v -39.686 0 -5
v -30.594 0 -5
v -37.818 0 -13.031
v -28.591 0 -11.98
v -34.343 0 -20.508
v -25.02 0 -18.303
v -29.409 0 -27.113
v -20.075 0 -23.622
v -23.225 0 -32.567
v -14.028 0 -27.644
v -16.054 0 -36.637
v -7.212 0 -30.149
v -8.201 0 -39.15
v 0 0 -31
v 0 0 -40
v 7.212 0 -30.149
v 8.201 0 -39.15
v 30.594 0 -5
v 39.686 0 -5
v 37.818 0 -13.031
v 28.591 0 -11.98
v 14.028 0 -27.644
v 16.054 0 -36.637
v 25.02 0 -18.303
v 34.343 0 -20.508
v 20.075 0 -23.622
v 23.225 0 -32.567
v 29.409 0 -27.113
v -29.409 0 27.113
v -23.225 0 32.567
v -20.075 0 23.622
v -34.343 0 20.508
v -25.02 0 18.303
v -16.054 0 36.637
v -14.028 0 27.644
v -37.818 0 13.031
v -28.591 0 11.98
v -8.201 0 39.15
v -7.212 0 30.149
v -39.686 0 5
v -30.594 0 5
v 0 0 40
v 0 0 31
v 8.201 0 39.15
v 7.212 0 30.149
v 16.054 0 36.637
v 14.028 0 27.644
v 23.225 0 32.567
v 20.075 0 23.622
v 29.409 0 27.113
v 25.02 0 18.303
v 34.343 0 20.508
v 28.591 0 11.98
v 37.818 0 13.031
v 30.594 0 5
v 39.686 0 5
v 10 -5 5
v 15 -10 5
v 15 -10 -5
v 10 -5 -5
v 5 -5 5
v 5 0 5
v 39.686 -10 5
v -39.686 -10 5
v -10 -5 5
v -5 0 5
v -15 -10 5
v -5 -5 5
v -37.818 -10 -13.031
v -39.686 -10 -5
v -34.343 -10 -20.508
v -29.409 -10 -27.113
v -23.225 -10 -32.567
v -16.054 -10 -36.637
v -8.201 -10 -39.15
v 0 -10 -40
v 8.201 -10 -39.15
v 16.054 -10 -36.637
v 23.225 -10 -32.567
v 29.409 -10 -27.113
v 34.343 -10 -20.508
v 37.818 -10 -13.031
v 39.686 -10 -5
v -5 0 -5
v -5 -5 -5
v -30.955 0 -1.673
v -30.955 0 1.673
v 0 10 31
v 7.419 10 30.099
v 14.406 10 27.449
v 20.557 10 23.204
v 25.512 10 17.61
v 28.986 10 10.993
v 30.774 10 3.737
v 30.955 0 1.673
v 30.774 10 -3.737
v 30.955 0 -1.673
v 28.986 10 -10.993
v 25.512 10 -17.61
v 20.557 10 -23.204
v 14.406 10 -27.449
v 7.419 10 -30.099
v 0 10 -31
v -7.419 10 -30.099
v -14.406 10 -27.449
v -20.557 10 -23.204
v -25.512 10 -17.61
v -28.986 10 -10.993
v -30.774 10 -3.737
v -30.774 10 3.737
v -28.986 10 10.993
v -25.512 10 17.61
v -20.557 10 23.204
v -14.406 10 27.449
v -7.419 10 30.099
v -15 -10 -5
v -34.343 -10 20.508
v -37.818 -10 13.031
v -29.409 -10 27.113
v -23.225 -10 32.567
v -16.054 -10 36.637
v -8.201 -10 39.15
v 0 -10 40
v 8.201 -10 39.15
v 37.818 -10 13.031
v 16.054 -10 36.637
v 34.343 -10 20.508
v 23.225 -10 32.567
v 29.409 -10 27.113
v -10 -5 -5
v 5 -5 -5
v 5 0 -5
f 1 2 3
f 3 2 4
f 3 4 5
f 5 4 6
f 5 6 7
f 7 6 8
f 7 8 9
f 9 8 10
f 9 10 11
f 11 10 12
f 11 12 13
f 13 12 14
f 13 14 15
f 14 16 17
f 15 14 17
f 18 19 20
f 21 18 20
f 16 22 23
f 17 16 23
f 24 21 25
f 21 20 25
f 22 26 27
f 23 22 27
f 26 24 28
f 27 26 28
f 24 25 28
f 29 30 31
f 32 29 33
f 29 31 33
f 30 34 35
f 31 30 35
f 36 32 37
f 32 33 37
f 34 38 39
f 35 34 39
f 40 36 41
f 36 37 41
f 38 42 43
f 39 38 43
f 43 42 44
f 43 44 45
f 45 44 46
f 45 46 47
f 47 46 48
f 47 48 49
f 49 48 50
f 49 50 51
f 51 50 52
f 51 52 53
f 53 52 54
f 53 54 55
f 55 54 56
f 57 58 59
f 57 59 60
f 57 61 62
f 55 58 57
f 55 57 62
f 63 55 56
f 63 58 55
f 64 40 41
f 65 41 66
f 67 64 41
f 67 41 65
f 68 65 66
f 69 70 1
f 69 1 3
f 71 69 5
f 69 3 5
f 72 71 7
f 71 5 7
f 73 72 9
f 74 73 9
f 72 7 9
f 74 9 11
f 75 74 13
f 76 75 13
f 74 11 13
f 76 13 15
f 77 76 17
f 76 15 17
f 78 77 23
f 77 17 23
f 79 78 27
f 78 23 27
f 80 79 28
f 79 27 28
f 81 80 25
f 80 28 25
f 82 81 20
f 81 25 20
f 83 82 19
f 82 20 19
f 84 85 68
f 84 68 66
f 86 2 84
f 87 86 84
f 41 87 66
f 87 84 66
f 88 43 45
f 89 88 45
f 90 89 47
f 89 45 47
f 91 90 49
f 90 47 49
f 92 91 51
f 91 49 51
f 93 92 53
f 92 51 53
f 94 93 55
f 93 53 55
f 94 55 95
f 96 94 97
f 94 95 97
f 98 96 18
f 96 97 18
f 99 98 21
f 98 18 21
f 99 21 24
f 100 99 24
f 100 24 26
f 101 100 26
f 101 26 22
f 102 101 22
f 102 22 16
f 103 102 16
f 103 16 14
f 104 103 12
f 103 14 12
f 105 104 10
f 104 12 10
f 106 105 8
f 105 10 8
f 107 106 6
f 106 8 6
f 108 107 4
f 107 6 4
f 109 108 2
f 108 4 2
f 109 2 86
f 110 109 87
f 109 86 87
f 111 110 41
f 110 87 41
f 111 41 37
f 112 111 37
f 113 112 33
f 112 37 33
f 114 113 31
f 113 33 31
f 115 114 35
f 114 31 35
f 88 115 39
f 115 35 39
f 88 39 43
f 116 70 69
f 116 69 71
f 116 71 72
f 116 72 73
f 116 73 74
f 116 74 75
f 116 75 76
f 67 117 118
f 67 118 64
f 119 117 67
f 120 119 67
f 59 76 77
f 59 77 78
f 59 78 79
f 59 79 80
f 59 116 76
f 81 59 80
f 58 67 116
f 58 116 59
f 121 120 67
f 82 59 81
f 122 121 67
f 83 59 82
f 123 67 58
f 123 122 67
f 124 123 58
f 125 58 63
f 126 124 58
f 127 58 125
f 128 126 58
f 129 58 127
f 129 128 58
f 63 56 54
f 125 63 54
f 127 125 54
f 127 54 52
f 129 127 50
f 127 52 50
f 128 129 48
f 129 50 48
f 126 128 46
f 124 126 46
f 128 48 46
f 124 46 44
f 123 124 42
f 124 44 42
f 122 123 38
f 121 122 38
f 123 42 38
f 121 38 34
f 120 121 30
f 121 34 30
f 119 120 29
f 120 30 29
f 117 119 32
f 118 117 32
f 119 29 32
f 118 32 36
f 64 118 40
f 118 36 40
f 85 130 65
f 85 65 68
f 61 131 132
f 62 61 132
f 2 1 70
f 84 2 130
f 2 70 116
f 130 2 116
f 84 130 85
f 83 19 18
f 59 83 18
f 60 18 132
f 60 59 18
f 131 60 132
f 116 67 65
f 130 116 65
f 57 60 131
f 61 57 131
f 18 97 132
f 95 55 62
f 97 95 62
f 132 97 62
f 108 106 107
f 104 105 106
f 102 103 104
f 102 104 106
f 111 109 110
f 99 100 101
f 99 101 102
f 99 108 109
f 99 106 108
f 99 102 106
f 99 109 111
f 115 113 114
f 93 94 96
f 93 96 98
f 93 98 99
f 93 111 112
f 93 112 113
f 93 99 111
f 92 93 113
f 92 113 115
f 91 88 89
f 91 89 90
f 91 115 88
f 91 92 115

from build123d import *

# Parameters (mm, degrees)
SKETCH1_R           = 31
BOSS_EXTRUDE1_DEPTH = 10
BOSS_EXTRUDE3_DEPTH = 10
CUT_EXTRUDE2_DEPTH  = 20
SKETCH8_R           = 40
BOSS_EXTRUDE4_DEPTH = 10
SKETCH9_W           = 7.5
SKETCH9_H           = 5
BOSS_EXTRUDE5_DEPTH = 10
CUT_EXTRUDE3_DEPTH  = 10


with BuildPart() as part:
    # Sketch1 → Boss-Extrude1 (new body)
    with BuildSketch(Plane(origin=(0, 0, 0), x_dir=(1, 0, 0), z_dir=(0, 1, 0))):
        with Locations(Location((0, 0, 0), (0, 0, 270))):
            Circle(SKETCH1_R)
    extrude(amount=BOSS_EXTRUDE1_DEPTH)

    # Sketch6 → Boss-Extrude3 (add)
    with BuildSketch(Plane(origin=(0, 0, 0), x_dir=(-1, 0, 0), z_dir=(0, -1, 0))):
        Polygon((15, 0), (15, -10), (-15, -10), (-15, 0), (-15, 10), (15, 10), align=None)
    extrude(amount=BOSS_EXTRUDE3_DEPTH)

    # Sketch7 → Cut-Extrude2 (cut)
    with BuildSketch(Plane(origin=(0, 0, -10), x_dir=(-1, 0, 0), z_dir=(0, 0, -1))):
        Polygon((10, -5), (5, -5), (5, 0), (15, 0), (15, -10), align=None)
        Polygon((-5, 0), (-15, 0), (-15, -10), (-10, -5), (-5, -5), align=None)
    extrude(amount=-CUT_EXTRUDE2_DEPTH, mode=Mode.SUBTRACT)

    # Sketch8 → Boss-Extrude4 (add)
    with BuildSketch(Plane.XZ):
        with Locations(Location((0, 0, 0), (0, 0, 270))):
            Circle(SKETCH8_R)
        Polygon((15, -10), (22.5, -10), (22.5, 10), (15, 10), (-15, 10), (-22.5, 10), (-22.5, -10), (-15, -10), align=None, mode=Mode.SUBTRACT)
    extrude(amount=BOSS_EXTRUDE4_DEPTH)

    # Sketch9 → Boss-Extrude5 (add)
    with BuildSketch(Plane.XZ.offset(10)):
        with Locations((-18.75, 7.5)):
            Rectangle(SKETCH9_W, SKETCH9_H)
        with Locations((18.75, 7.5)):
            Rectangle(SKETCH9_W, SKETCH9_H)
        with Locations((18.75, -7.5)):
            Rectangle(SKETCH9_W, SKETCH9_H)
        with Locations((-18.75, -7.5)):
            Rectangle(SKETCH9_W, SKETCH9_H)
        Polygon((-15, 5), (0, 5), (15, 5), (15, 10), (-15, 10), align=None)
        Polygon((15, -10), (15, -5), (0, -5), (-15, -5), (-15, -10), align=None)
    extrude(amount=-BOSS_EXTRUDE5_DEPTH)

    # Sketch10 → Cut-Extrude3 (cut)
    with BuildSketch(Plane.XZ.offset(10)):
        Polygon((-22.5, -5), (-39.686269666, -5), (-48.180542602, -5), (-48.180542602, 5), (-22.5, 5), align=None)
        Polygon((22.5, 5), (48.180542602, 5), (48.180542602, -5), (39.686269666, -5), (22.5, -5), align=None)
    extrude(amount=-CUT_EXTRUDE3_DEPTH, mode=Mode.SUBTRACT)


solid = part.part
